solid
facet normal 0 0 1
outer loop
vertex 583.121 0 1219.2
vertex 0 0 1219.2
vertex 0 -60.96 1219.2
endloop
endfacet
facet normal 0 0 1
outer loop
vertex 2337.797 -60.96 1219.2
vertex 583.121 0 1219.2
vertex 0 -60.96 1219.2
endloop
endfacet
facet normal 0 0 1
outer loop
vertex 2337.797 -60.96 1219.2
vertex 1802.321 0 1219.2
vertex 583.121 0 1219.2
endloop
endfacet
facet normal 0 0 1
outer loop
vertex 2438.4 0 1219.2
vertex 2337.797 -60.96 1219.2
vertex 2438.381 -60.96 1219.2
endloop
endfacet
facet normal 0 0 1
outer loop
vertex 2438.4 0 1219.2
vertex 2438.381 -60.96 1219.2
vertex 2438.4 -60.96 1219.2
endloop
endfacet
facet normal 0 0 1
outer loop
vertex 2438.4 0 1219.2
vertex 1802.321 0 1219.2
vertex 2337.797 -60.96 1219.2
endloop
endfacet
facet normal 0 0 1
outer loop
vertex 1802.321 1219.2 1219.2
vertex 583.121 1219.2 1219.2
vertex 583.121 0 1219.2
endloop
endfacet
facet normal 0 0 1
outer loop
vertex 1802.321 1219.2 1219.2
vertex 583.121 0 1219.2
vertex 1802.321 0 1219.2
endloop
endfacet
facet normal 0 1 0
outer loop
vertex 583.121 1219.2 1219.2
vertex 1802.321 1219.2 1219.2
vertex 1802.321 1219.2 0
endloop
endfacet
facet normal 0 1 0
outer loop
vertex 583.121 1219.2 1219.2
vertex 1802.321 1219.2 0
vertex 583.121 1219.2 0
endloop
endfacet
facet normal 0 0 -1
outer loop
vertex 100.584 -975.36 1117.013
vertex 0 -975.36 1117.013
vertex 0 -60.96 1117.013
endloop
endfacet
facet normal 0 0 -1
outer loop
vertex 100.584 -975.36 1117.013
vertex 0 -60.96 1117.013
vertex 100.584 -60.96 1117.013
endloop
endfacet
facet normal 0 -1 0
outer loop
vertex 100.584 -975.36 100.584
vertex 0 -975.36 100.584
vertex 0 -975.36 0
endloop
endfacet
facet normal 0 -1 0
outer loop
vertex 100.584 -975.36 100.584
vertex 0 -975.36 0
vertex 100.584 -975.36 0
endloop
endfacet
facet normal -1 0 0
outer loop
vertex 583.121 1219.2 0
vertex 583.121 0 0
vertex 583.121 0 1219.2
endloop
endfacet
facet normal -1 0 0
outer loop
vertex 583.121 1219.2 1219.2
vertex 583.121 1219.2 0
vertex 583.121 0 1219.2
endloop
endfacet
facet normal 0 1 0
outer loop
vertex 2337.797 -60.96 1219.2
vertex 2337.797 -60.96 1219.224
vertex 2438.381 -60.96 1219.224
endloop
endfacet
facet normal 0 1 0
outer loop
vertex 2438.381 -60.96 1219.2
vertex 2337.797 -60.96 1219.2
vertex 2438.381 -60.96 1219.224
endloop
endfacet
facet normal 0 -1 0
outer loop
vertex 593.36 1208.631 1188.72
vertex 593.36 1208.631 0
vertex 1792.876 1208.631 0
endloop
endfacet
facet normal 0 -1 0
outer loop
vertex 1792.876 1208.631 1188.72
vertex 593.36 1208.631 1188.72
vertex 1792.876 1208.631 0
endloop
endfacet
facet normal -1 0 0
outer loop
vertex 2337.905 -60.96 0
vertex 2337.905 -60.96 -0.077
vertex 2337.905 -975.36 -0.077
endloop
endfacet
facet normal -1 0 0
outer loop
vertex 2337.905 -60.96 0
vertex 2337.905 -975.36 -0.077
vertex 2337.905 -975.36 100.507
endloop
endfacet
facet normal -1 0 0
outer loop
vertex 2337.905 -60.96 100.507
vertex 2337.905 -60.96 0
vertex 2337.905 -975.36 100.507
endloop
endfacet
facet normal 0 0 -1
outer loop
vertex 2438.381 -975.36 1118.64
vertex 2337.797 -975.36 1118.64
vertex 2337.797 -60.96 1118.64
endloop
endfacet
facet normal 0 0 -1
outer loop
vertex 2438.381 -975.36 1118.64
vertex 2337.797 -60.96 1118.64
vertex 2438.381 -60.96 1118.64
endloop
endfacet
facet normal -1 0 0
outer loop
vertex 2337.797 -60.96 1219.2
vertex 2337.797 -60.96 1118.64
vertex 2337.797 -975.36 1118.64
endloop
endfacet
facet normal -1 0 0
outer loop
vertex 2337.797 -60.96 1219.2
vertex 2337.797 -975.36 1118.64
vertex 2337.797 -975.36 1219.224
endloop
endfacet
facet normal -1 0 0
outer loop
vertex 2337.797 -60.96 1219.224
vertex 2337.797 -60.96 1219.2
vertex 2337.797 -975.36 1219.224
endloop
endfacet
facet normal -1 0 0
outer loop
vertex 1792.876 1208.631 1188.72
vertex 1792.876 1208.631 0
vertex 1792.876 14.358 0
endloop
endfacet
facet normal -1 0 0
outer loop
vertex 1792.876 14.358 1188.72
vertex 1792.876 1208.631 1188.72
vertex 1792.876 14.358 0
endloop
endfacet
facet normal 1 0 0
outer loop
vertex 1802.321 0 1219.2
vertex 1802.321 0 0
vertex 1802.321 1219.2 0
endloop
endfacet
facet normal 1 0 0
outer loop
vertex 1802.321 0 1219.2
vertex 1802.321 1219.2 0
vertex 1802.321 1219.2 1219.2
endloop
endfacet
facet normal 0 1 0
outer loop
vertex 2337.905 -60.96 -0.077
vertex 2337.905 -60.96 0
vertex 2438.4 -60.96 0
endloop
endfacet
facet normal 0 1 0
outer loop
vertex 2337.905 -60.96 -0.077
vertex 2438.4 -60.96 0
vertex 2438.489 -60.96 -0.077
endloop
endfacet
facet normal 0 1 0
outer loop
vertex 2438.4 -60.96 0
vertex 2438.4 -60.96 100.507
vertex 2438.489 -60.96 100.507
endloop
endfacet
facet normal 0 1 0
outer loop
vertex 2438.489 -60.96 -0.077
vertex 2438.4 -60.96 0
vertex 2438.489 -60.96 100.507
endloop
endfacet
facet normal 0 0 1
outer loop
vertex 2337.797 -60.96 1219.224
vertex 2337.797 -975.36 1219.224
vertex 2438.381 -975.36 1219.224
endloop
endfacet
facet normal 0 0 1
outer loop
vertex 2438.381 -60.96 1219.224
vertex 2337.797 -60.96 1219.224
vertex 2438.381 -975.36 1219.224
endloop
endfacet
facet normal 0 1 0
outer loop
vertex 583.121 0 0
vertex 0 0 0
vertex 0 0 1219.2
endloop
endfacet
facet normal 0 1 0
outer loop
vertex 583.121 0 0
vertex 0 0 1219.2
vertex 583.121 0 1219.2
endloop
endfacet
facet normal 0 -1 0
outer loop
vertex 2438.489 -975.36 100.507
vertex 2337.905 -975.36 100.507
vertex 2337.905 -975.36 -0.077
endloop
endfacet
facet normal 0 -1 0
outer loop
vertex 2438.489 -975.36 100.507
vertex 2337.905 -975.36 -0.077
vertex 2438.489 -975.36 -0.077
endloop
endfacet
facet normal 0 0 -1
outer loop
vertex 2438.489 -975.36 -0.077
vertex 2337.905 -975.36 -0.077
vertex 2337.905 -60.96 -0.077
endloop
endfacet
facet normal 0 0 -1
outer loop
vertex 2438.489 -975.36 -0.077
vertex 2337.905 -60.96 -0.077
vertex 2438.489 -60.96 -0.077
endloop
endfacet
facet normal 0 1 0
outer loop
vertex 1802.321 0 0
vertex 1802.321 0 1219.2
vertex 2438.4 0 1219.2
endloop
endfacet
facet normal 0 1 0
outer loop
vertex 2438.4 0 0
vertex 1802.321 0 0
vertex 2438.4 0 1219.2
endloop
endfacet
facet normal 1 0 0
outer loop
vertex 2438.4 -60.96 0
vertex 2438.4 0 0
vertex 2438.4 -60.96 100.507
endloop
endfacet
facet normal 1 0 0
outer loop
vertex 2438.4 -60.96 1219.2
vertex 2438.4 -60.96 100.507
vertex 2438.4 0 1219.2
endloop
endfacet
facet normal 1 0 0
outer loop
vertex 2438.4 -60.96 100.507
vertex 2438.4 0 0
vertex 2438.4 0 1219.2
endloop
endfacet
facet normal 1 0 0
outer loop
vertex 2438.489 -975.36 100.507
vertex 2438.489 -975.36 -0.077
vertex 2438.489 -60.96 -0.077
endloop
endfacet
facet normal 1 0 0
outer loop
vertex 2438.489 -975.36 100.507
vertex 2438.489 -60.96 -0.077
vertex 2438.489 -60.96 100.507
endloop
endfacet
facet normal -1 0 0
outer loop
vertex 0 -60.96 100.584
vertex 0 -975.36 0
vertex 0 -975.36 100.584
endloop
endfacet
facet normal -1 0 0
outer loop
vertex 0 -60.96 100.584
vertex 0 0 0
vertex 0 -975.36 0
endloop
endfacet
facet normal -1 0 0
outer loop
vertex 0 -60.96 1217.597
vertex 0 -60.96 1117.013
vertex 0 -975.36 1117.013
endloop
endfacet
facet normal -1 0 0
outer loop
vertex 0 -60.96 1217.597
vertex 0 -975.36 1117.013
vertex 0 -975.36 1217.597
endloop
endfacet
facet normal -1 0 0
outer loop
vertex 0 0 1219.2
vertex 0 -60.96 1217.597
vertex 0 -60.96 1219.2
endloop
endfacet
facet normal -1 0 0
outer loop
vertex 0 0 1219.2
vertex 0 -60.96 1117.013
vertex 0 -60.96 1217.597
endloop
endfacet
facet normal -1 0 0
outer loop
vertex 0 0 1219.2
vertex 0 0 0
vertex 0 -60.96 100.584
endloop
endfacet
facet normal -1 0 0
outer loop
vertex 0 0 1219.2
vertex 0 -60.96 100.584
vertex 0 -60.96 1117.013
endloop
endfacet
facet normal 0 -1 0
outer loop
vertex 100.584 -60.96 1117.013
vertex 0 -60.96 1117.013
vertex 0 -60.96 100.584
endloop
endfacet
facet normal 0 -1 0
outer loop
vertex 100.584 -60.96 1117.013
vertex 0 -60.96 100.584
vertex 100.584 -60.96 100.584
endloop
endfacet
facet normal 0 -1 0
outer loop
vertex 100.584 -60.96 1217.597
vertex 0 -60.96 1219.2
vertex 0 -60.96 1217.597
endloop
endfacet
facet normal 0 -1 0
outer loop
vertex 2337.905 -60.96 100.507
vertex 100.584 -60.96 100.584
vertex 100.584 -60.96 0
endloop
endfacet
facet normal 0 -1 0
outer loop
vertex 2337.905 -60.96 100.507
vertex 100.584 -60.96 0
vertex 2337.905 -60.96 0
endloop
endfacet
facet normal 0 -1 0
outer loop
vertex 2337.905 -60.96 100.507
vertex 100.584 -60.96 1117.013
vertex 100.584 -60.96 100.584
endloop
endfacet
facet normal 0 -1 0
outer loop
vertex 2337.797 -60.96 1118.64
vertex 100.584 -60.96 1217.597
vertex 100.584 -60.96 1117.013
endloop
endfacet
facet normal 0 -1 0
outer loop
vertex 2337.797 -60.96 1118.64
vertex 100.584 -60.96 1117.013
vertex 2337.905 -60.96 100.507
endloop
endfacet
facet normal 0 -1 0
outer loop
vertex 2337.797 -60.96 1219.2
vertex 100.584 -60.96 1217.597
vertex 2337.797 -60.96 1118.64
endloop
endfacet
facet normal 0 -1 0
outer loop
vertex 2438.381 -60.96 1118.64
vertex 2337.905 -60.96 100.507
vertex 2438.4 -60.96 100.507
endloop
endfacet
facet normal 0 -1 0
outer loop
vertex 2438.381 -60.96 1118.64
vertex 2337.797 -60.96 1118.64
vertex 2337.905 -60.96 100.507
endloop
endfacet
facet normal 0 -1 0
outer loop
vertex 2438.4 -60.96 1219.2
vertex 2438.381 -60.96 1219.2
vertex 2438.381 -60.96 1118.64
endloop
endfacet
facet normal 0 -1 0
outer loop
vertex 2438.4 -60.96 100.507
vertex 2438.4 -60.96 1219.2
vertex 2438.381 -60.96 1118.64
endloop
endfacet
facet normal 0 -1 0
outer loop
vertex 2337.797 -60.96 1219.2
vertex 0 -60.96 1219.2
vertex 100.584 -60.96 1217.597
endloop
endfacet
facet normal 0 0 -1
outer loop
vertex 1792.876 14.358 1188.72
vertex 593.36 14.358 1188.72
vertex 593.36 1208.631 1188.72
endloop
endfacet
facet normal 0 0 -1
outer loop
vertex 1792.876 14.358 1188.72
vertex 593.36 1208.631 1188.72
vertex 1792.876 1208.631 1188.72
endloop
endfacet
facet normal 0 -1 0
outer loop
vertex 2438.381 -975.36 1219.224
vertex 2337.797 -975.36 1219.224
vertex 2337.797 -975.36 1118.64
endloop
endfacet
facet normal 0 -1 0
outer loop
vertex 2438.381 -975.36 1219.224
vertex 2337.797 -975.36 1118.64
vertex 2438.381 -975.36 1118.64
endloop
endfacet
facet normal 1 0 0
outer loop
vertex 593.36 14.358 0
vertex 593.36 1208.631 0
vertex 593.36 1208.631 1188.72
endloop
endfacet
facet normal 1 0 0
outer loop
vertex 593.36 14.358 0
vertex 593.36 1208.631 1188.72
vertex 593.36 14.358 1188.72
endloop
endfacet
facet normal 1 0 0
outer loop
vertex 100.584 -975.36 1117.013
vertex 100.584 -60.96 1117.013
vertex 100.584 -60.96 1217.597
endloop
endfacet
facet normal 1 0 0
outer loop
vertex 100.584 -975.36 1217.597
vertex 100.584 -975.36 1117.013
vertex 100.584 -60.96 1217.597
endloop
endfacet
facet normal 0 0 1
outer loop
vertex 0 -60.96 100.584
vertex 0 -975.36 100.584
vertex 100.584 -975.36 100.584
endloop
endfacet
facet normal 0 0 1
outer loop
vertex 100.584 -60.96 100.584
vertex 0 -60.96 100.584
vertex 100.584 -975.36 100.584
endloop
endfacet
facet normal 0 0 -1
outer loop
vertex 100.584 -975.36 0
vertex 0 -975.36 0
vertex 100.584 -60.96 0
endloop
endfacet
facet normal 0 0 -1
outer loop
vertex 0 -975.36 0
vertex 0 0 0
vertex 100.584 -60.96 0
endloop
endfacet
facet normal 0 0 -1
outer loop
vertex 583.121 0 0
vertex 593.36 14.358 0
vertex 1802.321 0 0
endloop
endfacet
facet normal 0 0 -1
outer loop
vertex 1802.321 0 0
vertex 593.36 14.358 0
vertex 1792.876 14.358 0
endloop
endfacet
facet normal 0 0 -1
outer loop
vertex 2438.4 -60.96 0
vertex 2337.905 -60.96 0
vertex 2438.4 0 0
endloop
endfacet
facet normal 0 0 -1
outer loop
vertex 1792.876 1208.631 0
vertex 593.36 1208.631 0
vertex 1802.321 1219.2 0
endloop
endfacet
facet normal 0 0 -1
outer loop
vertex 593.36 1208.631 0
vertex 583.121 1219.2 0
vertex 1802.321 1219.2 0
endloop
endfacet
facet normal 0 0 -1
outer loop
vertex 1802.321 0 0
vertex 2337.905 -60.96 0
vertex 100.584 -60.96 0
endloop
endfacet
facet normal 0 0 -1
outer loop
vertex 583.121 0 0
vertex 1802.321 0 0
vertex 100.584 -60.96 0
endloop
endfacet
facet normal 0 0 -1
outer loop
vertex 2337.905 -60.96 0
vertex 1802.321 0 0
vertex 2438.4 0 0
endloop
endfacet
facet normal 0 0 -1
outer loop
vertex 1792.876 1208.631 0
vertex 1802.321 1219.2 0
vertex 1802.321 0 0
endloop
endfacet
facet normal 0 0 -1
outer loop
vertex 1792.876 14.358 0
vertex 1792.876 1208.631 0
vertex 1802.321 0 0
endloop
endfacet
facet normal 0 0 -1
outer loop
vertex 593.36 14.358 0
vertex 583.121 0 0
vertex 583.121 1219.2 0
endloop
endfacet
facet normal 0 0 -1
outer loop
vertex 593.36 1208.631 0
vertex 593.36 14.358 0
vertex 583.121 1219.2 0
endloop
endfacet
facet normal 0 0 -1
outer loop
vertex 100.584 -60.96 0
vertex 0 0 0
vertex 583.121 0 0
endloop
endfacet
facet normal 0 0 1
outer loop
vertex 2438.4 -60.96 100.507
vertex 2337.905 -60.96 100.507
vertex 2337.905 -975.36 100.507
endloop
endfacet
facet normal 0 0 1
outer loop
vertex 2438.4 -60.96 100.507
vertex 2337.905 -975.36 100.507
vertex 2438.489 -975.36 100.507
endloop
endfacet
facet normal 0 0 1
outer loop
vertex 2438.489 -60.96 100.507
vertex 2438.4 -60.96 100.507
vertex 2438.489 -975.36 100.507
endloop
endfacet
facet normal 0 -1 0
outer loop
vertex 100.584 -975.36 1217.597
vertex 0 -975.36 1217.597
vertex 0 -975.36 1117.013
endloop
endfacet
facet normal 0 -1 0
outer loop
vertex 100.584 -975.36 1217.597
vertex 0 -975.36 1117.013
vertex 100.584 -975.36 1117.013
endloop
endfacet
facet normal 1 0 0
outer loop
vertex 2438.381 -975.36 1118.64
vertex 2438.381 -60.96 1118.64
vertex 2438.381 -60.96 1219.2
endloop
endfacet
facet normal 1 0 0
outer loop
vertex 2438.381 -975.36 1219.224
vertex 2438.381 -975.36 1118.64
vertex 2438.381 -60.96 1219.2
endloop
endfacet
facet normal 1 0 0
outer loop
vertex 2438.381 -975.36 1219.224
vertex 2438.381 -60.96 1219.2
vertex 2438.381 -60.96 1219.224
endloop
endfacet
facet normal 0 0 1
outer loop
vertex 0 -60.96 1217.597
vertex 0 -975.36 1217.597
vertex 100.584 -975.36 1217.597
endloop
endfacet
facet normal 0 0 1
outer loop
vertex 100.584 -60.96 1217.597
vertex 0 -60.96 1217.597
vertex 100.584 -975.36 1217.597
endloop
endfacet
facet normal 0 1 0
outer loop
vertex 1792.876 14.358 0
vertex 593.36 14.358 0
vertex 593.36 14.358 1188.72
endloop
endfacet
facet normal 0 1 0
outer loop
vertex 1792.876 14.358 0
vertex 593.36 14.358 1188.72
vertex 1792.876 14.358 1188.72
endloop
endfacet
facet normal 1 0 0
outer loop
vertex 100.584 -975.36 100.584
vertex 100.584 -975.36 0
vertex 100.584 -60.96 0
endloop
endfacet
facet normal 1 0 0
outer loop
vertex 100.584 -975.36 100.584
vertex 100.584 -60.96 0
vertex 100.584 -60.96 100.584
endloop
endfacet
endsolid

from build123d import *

# Parameters (mm, degrees)
F0_W     = 2438.4
F0_H     = 1219.2
F1_DEPTH = 60.96
F3_W     = 100.584
F3_H     = 100.584
F4_DEPTH = 914.4
F5_W     = 1219.2
F5_H     = 1219.2
F6_DEPTH = 1219.2
F7_W     = 1199.515164
F7_H     = 1194.27278
F8_DEPTH = 1188.72


with BuildPart() as f1:
    # F0 (on Front) → F1 (new body)
    with BuildSketch(Plane.XZ):
        with Locations((1219.2, 609.6)):
            Rectangle(F0_W, F0_H)
    extrude(amount=F1_DEPTH)

    # F3 (on face) → F4 (join)
    with BuildSketch(Plane.XZ.offset(60.96)):
        with Locations((50.292, 50.292)):
            Rectangle(F3_W, F3_H)
        with Locations((50.292, 1167.305365)):
            Rectangle(F3_W, F3_H)
        with Locations((2388.089433, 1168.932334)):
            Rectangle(F3_W, F3_H)
        with Locations((2388.196945, 50.215379)):
            Rectangle(F3_W, F3_H)
    extrude(amount=F4_DEPTH)

    # F5 (on face) → F6 (join)
    with BuildSketch(Plane(origin=(0, 0, 0), x_dir=(-1, 0, 0), z_dir=(0, 1, 0))):
        with Locations((-1192.721315, 609.6)):
            Rectangle(F5_W, F5_H)
    extrude(amount=F6_DEPTH)

    # F7 (on face) → F8 (cut)
    with BuildSketch(Plane(origin=(0, 0, 0), x_dir=(1, 0, 0), z_dir=(0, 0, -1))):
        with Locations((1193.118066, -611.494291)):
            Rectangle(F7_W, F7_H)
    extrude(amount=-F8_DEPTH, mode=Mode.SUBTRACT)


solid = f1.part
